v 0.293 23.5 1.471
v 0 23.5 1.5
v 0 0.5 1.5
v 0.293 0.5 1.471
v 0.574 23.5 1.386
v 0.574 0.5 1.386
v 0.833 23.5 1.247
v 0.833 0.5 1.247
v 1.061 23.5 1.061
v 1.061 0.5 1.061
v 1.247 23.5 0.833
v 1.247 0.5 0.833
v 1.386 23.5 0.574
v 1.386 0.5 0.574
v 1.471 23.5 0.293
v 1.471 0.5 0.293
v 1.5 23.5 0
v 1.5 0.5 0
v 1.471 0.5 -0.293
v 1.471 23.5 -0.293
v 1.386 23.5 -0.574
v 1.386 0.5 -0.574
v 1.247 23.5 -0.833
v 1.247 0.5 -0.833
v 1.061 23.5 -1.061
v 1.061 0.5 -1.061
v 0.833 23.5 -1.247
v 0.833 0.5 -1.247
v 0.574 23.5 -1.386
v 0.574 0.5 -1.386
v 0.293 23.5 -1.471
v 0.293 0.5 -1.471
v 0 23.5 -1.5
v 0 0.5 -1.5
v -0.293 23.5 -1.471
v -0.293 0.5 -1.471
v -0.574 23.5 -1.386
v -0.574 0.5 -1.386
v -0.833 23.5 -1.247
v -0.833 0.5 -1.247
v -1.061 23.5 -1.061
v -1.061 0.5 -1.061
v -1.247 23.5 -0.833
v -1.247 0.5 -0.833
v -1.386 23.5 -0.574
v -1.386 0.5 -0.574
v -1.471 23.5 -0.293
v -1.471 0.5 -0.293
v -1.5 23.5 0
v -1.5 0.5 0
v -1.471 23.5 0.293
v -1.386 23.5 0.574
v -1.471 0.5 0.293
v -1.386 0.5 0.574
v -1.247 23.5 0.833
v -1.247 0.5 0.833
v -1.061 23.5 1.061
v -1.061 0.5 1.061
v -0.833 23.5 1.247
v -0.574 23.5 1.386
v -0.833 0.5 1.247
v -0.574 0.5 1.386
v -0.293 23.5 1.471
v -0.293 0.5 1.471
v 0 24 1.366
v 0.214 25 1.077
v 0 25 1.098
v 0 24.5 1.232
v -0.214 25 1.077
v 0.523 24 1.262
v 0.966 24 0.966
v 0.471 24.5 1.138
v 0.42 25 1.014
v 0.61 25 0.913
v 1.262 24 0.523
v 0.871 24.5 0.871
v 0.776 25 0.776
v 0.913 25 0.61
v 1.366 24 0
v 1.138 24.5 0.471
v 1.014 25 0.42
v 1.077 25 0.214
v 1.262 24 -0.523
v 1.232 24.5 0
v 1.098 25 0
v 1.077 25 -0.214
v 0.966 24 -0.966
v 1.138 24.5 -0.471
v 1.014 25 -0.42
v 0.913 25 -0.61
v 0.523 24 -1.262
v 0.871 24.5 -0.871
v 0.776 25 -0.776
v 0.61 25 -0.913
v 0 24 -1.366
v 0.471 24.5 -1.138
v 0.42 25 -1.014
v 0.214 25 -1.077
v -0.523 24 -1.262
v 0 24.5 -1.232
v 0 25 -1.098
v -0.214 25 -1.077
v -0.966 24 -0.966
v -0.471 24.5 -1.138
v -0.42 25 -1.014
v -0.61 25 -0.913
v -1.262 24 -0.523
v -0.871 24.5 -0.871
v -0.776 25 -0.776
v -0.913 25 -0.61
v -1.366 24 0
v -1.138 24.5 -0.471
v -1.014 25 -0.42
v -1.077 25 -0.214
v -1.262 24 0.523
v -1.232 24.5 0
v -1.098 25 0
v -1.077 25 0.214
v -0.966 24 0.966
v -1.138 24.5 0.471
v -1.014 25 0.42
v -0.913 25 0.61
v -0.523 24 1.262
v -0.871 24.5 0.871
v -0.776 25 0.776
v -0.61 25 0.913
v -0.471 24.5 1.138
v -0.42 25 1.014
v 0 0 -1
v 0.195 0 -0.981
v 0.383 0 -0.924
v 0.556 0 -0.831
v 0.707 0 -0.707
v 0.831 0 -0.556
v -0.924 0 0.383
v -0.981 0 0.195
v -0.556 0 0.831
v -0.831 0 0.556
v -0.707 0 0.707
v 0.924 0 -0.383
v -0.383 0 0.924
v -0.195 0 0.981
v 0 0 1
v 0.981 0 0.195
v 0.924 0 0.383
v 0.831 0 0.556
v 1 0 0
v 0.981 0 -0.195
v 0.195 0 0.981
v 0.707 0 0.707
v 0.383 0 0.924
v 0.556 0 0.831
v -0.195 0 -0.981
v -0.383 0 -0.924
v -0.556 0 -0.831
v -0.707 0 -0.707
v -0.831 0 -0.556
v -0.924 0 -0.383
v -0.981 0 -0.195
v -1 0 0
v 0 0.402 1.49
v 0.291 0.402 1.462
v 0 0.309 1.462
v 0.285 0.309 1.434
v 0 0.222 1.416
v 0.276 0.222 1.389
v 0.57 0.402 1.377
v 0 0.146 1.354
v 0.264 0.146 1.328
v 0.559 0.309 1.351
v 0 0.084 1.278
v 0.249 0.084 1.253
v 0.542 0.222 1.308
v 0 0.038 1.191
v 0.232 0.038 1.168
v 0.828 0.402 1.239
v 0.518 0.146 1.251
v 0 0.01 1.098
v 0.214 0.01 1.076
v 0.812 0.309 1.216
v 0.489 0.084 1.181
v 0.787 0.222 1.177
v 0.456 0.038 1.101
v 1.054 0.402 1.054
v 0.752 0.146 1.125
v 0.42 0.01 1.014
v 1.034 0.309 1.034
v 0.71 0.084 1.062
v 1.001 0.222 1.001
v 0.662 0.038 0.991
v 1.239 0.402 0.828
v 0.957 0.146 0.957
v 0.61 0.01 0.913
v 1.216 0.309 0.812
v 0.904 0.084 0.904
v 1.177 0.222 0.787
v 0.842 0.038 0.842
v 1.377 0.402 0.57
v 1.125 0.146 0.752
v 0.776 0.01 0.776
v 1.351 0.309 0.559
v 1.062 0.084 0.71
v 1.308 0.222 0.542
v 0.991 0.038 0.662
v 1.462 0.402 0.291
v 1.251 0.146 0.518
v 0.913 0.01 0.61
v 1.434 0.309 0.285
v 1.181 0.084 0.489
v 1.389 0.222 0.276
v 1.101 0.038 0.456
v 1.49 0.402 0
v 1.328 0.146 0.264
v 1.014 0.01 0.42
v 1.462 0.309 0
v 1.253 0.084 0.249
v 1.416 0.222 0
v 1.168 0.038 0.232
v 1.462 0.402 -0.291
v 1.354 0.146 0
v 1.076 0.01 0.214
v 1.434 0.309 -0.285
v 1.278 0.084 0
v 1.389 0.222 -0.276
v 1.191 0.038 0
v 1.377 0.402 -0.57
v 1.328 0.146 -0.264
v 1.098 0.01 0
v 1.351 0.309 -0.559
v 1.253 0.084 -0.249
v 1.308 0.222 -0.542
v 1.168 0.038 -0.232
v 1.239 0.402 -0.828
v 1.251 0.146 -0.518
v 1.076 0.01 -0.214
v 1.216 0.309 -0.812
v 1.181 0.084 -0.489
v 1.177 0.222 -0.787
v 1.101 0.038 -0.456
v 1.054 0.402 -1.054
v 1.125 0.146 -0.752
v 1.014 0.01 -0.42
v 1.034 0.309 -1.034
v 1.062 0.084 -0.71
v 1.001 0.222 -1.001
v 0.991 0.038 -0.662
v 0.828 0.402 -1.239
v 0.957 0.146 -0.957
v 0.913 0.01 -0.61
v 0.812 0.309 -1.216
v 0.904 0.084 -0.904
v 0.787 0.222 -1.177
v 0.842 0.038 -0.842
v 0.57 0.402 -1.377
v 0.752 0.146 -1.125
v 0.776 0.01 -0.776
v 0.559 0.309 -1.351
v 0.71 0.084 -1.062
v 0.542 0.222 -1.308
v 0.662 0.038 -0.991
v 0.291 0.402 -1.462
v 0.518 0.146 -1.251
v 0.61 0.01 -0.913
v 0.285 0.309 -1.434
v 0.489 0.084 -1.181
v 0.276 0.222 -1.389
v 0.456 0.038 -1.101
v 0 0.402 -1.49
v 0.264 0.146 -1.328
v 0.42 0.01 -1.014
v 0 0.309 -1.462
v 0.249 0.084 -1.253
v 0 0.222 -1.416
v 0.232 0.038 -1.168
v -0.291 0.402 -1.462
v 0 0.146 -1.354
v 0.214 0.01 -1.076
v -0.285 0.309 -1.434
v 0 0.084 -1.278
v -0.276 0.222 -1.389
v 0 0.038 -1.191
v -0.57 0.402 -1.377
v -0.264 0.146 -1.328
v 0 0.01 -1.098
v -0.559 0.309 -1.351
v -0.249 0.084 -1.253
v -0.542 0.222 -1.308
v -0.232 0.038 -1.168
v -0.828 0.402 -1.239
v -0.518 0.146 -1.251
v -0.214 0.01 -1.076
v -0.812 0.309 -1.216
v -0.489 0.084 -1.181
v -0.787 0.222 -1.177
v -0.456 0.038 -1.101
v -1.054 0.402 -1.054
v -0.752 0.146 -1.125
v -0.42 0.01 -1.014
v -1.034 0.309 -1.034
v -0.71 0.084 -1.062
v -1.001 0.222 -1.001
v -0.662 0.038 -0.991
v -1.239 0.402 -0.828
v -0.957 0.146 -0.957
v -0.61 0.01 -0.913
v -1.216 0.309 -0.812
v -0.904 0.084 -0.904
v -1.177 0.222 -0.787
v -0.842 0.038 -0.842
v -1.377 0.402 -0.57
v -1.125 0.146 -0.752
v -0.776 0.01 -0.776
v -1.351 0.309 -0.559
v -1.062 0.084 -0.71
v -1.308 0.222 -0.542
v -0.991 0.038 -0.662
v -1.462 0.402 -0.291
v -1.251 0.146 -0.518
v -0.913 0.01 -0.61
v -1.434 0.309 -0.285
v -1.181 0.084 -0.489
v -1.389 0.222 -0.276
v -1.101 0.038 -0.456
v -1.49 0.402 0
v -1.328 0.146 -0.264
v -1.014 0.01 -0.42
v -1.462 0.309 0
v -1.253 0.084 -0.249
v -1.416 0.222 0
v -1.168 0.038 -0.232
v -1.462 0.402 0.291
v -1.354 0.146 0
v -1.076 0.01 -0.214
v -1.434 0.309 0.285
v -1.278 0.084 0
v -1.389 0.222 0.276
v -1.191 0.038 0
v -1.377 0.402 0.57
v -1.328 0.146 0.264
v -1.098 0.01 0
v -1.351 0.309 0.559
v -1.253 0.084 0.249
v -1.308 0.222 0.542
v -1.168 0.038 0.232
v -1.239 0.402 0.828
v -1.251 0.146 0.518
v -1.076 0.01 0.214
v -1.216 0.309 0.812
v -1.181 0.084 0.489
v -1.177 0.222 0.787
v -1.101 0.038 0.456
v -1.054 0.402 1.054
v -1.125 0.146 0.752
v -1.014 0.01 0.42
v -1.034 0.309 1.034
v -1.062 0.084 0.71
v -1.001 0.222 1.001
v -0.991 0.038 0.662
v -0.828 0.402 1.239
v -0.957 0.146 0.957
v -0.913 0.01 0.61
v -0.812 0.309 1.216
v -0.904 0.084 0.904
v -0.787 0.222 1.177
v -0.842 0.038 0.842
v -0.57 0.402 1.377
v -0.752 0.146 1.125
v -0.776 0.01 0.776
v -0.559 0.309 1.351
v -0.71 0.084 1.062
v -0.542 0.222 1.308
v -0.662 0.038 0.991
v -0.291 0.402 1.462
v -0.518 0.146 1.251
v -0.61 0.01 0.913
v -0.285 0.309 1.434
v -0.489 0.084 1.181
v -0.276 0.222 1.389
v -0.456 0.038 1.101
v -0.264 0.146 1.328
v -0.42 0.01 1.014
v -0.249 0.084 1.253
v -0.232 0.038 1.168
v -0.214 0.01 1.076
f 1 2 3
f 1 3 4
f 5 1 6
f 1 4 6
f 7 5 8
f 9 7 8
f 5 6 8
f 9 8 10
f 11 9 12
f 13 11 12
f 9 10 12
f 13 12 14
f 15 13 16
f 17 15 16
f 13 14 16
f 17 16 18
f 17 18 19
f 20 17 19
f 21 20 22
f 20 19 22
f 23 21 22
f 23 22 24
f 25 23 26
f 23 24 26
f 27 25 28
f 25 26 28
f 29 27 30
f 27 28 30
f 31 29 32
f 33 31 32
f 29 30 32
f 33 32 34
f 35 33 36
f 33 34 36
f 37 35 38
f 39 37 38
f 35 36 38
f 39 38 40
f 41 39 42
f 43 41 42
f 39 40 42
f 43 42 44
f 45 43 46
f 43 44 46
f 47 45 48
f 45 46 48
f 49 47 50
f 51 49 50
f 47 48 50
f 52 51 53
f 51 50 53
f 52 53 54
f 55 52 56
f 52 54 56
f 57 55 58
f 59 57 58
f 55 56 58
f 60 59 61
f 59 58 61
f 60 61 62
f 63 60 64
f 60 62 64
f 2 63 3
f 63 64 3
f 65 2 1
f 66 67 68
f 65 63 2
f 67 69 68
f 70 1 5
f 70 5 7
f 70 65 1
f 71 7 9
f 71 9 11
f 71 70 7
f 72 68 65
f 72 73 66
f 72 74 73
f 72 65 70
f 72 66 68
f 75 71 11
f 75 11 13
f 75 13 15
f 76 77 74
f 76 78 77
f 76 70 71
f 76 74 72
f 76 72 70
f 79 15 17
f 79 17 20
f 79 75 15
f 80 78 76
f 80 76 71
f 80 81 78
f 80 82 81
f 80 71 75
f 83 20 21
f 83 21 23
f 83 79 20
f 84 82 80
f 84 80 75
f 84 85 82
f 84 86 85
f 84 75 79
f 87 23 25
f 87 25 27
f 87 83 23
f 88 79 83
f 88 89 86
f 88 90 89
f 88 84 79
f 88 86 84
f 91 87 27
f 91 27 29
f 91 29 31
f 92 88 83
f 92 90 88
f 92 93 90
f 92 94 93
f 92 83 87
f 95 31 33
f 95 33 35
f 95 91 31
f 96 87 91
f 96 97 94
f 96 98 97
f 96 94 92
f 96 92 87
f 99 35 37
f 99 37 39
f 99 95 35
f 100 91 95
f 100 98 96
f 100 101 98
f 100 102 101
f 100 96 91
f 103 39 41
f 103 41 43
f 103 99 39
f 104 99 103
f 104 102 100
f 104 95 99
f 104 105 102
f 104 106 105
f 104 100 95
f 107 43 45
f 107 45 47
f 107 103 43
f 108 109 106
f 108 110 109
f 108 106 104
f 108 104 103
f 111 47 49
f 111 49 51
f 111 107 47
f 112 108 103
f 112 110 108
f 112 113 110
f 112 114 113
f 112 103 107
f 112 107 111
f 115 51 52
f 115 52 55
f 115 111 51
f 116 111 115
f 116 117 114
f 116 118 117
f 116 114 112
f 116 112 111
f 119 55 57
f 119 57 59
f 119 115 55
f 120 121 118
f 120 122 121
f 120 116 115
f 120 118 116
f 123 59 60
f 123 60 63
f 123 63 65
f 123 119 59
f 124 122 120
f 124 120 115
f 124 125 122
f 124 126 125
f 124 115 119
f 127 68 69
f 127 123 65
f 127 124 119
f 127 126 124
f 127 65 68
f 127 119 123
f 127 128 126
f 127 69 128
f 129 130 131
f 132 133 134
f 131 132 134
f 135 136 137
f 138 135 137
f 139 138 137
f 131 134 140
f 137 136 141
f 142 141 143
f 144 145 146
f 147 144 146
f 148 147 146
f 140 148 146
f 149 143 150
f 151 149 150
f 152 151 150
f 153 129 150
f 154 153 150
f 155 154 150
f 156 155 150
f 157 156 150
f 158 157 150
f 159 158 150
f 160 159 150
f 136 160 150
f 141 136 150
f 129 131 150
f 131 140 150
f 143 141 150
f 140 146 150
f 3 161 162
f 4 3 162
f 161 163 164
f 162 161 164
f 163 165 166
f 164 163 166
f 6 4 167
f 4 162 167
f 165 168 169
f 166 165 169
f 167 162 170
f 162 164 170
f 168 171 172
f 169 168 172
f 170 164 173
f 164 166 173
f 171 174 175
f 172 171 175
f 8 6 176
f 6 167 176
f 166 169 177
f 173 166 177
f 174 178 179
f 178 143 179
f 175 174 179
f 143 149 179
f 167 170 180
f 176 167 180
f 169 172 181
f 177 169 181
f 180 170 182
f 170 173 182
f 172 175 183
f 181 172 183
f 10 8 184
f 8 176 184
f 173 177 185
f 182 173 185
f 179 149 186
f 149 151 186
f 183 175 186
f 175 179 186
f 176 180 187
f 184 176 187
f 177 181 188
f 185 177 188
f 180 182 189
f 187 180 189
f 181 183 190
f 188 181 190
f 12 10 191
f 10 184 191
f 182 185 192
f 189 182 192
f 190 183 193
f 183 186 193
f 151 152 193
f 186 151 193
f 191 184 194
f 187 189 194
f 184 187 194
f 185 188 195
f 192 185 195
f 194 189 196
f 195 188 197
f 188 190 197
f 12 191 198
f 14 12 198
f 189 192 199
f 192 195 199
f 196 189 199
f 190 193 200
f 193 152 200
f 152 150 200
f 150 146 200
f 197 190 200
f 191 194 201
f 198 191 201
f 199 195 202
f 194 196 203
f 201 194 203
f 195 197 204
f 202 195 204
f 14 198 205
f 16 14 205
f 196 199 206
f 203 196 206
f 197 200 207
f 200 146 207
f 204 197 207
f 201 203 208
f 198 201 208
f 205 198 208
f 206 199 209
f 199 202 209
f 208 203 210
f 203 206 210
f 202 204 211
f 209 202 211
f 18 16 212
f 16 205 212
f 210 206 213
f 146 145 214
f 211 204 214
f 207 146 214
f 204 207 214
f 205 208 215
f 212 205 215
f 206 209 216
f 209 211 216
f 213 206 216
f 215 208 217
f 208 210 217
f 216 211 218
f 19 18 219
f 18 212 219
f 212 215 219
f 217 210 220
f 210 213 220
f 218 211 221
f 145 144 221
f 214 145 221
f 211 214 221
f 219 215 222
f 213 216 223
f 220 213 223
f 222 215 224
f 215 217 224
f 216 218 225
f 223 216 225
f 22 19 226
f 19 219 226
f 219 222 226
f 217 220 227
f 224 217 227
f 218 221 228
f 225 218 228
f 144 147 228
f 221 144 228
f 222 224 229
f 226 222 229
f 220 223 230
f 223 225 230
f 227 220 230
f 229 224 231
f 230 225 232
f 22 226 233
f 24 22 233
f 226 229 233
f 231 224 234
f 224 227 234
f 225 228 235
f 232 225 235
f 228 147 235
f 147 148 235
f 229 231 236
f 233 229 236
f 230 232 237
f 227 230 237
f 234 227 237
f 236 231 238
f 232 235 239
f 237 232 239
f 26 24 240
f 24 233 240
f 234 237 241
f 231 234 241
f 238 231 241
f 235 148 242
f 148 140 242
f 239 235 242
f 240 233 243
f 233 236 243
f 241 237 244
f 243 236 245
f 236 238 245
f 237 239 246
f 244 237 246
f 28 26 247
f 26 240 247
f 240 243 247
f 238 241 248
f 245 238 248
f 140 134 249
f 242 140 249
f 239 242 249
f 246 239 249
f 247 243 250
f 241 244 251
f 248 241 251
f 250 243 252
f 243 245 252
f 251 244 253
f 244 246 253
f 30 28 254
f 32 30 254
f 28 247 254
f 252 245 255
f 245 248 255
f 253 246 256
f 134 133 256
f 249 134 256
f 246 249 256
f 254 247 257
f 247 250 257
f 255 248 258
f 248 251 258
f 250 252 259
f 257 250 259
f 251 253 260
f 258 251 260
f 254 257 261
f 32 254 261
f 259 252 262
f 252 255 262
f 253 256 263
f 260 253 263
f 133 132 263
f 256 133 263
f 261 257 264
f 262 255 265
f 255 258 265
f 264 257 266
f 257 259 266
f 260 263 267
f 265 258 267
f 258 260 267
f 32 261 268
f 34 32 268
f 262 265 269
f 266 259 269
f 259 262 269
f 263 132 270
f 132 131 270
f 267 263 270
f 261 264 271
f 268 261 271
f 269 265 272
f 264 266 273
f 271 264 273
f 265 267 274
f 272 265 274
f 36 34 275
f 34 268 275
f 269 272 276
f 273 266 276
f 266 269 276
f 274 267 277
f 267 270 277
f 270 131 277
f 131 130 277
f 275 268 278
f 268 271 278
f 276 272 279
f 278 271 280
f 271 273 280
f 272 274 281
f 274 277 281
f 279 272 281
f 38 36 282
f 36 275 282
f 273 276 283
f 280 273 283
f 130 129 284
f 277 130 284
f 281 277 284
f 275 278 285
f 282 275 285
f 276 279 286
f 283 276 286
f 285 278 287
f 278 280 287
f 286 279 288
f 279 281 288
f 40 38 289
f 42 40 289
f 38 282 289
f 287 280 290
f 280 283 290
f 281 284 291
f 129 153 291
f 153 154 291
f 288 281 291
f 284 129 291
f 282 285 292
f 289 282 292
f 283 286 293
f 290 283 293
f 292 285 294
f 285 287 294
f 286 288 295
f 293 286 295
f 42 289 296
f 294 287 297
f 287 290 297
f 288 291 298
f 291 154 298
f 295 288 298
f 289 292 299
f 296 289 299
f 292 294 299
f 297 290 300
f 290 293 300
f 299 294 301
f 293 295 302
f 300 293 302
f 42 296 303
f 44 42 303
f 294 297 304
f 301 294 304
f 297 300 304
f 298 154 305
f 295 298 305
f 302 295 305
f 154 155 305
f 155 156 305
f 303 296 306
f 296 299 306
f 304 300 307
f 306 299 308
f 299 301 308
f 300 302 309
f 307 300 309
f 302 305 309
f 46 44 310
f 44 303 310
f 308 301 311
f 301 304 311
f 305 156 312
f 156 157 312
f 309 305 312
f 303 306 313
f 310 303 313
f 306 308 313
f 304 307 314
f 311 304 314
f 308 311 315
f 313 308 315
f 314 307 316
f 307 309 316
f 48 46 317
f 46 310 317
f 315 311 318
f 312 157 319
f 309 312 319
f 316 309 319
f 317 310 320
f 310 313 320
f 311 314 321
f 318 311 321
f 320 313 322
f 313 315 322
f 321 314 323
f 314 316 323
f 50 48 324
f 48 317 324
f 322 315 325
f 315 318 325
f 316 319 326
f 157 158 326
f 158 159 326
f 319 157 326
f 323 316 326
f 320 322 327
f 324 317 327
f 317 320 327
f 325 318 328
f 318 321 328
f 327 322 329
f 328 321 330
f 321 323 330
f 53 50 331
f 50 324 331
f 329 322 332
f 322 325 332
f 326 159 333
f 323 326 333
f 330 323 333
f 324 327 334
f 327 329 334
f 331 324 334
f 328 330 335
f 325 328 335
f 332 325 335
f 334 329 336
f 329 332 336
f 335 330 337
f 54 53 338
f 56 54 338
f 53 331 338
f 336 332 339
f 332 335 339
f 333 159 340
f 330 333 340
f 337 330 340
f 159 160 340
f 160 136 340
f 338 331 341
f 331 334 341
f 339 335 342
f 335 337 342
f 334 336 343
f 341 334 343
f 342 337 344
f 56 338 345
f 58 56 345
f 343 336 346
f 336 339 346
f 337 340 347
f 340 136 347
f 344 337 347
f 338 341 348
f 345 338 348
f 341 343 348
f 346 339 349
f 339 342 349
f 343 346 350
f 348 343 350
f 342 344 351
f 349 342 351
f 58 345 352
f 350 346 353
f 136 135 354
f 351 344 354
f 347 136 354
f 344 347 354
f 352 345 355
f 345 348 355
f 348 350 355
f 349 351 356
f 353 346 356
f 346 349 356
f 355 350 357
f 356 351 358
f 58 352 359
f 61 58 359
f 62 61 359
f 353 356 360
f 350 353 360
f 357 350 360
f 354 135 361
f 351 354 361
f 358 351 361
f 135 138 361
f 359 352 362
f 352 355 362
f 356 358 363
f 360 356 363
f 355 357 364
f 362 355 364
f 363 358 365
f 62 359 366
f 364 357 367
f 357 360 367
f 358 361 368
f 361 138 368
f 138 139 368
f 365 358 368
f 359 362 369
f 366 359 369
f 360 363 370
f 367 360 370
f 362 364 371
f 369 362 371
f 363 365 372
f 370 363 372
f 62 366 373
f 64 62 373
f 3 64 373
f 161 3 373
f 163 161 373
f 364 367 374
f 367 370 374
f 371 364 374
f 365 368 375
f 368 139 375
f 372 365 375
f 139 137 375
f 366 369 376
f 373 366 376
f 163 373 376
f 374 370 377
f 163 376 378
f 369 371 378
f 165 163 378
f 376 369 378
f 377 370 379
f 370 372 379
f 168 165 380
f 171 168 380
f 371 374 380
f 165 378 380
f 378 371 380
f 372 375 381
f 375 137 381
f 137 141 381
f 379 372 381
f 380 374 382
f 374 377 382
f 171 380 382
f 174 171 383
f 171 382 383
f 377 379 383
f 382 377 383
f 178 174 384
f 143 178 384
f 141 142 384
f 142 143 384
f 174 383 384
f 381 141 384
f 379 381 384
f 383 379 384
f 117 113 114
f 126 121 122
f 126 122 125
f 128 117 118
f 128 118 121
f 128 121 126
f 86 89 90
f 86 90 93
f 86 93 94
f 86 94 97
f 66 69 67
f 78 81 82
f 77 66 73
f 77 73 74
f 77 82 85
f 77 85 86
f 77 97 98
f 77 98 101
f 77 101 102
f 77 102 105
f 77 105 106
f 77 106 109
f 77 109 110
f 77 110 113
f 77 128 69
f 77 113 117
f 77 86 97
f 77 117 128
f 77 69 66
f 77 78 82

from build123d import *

# Parameters (mm, degrees)
SKETCH1_R           = 1.5
BOSS_EXTRUDE1_DEPTH = 25
CHAMFER1_SIZE       = 1.5
CHAMFER1_SIZE2      = 0.401923789
FILLET1_R           = 0.5


with BuildPart() as part:
    # Sketch1 → Boss-Extrude1 (new body)
    with BuildSketch(Plane(origin=(0, 0, 0), x_dir=(1, 0, 0), z_dir=(0, 1, 0))):
        with Locations(Location((0, 0, 0), (0, 0, 270))):
            Circle(SKETCH1_R)
    extrude(amount=BOSS_EXTRUDE1_DEPTH)

    # Chamfer1
    chamfer1_edges = [part.edges().sort_by_distance(p)[0] for p in [
        (0, 25, -1.5),
    ]]
    chamfer1_side = [part.faces().sort_by_distance(p)[0] for p in [
        (0, 12.5, -1.5),
    ]]
    chamfer(chamfer1_edges, length=CHAMFER1_SIZE, length2=CHAMFER1_SIZE2, reference=chamfer1_side[0])

    # Fillet1
    fillet1_edges = [part.edges().sort_by_distance(p)[0] for p in [
        (0, 0, -1.5),
    ]]
    fillet(fillet1_edges, radius=FILLET1_R)


solid = part.part
